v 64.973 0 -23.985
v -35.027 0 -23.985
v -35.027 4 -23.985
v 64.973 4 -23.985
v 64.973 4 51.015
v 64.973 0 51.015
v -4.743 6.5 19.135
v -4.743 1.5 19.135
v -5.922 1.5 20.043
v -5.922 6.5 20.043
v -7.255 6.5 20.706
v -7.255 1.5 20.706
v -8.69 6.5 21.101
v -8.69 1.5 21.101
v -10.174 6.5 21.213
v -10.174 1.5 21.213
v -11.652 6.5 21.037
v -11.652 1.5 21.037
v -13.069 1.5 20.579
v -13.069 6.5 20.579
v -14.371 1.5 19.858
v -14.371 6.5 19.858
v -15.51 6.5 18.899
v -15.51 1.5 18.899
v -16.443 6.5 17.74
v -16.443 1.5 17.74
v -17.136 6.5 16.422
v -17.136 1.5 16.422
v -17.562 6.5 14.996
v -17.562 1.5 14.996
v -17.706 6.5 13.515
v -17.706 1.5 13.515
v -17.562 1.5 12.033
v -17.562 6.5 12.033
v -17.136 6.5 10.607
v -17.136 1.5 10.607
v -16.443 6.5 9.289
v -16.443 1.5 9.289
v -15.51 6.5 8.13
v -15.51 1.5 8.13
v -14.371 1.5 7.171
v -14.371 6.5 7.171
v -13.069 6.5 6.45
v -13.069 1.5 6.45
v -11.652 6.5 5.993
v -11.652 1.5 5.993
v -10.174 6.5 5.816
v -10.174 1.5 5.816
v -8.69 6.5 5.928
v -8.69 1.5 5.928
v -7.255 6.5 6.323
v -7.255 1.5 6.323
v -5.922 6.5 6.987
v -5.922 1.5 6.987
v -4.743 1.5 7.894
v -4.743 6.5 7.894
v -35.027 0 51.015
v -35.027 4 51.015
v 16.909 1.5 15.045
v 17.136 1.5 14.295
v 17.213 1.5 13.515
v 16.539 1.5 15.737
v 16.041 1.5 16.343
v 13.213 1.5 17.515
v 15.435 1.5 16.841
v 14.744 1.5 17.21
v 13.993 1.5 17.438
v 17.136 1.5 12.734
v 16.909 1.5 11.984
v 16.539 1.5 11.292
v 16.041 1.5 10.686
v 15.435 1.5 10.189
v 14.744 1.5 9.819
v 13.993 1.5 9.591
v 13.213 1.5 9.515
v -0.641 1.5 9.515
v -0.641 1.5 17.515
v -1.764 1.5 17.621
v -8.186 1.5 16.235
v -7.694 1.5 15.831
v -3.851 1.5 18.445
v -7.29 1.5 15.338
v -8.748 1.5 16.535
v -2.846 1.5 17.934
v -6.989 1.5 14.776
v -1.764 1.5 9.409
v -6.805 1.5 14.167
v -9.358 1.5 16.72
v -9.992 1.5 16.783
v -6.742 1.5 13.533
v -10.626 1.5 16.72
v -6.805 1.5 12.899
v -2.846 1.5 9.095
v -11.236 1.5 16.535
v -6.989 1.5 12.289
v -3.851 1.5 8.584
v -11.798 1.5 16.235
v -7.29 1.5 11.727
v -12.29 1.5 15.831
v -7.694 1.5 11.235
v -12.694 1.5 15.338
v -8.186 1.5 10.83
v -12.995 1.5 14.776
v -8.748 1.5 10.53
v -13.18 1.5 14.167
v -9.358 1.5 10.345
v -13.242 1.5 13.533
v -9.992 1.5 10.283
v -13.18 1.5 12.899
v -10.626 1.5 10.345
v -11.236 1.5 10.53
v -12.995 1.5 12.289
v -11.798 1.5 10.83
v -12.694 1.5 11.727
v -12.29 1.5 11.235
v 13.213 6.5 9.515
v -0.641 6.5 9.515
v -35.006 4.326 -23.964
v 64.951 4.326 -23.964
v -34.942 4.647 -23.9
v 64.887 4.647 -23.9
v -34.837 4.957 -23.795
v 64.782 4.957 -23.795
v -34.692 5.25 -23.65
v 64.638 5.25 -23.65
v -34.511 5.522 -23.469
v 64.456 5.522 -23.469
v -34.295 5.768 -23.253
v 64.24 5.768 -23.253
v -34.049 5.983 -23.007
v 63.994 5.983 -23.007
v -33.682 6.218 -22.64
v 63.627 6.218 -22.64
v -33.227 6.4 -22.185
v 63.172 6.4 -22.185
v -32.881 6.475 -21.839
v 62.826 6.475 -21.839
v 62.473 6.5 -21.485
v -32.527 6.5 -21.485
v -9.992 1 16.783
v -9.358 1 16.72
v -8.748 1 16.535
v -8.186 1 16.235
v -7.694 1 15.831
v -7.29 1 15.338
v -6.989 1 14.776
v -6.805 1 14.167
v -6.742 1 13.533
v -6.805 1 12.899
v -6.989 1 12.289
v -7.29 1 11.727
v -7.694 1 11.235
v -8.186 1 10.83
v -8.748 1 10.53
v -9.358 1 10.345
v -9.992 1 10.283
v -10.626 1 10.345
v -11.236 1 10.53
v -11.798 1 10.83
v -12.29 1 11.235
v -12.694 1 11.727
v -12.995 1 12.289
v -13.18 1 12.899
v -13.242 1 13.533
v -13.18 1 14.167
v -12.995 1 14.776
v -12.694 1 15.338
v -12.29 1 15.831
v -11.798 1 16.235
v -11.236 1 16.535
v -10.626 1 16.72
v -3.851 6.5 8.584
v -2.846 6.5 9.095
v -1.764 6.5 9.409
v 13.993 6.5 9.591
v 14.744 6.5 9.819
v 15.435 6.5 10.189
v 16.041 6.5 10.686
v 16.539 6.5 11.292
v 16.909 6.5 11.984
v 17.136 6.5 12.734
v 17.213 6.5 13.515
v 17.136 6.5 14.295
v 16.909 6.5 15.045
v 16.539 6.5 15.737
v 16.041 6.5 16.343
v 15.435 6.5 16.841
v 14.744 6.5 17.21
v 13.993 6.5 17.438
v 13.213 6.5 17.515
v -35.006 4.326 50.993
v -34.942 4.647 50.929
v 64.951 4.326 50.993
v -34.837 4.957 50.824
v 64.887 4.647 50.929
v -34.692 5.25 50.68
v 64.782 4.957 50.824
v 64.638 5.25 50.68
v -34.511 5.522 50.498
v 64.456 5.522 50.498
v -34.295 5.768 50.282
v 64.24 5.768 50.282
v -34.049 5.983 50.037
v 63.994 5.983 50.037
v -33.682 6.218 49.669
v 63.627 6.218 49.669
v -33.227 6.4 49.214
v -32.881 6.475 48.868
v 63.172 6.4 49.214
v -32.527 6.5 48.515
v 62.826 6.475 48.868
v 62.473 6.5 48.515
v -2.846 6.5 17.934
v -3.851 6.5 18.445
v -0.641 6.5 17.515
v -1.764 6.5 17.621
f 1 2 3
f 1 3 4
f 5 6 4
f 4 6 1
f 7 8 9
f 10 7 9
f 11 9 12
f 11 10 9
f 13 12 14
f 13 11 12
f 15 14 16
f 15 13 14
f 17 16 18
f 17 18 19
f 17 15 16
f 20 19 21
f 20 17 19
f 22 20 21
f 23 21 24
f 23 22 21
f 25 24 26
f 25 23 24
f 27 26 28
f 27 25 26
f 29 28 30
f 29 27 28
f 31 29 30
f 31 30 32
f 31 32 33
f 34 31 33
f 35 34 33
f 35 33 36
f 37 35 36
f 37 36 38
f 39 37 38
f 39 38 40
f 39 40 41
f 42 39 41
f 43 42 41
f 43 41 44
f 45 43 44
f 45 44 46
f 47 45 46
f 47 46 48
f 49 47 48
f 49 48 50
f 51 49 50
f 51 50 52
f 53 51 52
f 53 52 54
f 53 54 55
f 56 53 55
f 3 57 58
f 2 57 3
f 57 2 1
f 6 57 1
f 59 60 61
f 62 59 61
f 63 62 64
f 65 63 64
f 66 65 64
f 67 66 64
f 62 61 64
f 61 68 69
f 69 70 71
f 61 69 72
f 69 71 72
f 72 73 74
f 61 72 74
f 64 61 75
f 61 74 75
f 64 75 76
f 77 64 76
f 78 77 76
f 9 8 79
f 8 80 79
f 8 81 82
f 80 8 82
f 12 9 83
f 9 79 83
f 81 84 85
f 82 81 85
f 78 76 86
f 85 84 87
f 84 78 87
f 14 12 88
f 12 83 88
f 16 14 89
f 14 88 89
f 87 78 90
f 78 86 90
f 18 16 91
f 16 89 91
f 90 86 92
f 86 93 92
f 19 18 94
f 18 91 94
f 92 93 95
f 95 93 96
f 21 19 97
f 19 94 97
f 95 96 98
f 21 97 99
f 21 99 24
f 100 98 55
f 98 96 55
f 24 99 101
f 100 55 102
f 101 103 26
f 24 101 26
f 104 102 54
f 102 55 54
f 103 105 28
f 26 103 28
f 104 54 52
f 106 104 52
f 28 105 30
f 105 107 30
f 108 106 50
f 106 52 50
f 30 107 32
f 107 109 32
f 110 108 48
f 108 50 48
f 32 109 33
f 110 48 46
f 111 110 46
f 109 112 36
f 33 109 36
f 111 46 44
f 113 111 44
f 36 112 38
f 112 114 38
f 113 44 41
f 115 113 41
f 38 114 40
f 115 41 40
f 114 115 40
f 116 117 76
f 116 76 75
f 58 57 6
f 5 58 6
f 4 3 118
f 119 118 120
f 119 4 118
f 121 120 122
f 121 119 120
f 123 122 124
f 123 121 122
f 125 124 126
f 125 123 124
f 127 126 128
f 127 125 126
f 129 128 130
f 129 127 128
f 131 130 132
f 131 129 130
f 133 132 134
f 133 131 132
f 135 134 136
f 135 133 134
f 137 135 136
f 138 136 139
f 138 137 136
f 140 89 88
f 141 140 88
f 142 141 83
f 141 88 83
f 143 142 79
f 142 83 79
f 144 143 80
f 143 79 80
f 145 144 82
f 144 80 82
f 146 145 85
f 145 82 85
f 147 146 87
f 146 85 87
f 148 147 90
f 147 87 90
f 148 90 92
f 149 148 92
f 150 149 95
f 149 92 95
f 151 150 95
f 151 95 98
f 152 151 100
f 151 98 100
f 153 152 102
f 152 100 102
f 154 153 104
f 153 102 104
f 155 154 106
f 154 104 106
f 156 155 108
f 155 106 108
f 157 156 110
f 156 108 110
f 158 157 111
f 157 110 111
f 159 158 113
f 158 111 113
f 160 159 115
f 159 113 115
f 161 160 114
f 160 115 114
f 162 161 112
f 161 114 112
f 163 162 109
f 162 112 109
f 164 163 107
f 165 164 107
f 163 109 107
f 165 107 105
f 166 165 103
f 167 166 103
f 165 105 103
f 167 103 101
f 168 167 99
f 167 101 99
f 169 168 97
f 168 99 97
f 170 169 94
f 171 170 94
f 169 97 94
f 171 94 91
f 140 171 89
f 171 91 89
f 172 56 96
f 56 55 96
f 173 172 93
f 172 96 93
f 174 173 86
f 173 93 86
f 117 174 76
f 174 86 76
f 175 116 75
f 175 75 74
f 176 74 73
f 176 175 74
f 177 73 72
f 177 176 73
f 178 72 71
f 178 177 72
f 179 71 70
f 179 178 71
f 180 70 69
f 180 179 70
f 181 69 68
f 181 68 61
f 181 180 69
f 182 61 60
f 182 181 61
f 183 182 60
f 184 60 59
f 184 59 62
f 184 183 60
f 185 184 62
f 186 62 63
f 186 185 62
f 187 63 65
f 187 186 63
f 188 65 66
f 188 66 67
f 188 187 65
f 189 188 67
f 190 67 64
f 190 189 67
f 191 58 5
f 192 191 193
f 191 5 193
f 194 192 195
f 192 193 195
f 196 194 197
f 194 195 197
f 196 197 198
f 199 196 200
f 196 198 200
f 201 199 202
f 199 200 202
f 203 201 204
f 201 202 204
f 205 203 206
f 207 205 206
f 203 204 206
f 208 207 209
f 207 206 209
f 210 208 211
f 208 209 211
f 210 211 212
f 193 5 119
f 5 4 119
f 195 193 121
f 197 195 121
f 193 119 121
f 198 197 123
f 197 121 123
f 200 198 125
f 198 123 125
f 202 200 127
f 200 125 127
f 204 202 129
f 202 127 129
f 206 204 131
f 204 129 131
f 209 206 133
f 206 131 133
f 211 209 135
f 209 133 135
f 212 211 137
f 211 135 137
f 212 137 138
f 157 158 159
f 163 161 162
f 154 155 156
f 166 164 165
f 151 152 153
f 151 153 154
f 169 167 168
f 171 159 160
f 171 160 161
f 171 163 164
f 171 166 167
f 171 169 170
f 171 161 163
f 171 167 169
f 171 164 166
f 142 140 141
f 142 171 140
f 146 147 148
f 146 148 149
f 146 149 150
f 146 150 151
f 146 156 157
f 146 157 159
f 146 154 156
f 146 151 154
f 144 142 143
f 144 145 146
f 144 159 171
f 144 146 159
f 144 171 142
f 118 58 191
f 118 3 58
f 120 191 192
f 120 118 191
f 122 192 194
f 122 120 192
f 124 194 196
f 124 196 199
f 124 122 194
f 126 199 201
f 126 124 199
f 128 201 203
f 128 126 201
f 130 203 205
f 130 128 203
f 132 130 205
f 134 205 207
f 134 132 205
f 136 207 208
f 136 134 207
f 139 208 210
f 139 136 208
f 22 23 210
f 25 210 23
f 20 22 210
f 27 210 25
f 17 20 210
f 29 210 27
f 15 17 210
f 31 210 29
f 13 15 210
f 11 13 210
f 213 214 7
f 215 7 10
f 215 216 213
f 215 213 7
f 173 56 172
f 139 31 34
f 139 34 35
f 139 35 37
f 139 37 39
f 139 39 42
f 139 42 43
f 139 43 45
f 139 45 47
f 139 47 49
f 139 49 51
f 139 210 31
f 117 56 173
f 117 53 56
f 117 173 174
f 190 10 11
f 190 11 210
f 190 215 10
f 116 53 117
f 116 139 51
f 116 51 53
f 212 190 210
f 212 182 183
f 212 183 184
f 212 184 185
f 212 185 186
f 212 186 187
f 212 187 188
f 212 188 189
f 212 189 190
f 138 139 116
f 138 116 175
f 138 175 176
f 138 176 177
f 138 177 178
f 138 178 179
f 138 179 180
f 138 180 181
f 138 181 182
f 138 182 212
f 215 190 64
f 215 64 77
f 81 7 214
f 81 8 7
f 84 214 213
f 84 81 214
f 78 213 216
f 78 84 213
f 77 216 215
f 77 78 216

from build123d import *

# Parameters (mm, degrees)
SKETCH2_W           = 100
SKETCH2_H           = 75
BOSS_EXTRUDE1_DEPTH = 6.5
FILLET1_R           = 2.5
CUT_EXTRUDE1_DEPTH  = 5
FILLET3_R           = 6
SKETCH4_R           = 3.25
CUT_EXTRUDE2_DEPTH  = 0.5


with BuildPart() as part:
    # Sketch2 → Boss-Extrude1 (new body)
    with BuildSketch(Plane(origin=(0, 0, 0), x_dir=(1, 0, 0), z_dir=(0, 1, 0))):
        with Locations((14.972577697, -13.514625229)):
            Rectangle(SKETCH2_W, SKETCH2_H)
    extrude(amount=BOSS_EXTRUDE1_DEPTH)

    # Fillet1
    fillet1_edges = [part.edges().sort_by_distance(p)[0] for p in [
        (64.972577697, 6.5, 13.514625229),
        (14.972577697, 6.5, -23.985374771),
        (-35.027422303, 6.5, 13.514625229),
        (14.972577697, 6.5, 51.014625229),
    ]]
    fillet(fillet1_edges, radius=FILLET1_R)

    # Sketch3 → Cut-Extrude1 (cut)
    with BuildSketch(Plane(origin=(0, 6.5, 0), x_dir=(1, 0, 0), z_dir=(0, 1, 0))):
        with BuildLine():
            Line((-3.42616702, -9.514625229), (13.213071542, -9.514625229))
            ThreePointArc((13.213071542, -9.514625229), (17.213071542, -13.514625229), (13.213071542, -17.514625229))
            Line((13.213071542, -17.514625229), (-3.42616702, -17.514625229))
            ThreePointArc((-3.42616702, -17.514625229), (-17.70568068, -13.514625229), (-3.42616702, -9.514625229))
        make_face()
    extrude(amount=-CUT_EXTRUDE1_DEPTH, mode=Mode.SUBTRACT)

    # Fillet3
    fillet3_edges = [part.edges().sort_by_distance(p)[0] for p in [
        (-3.42616702, 4, 17.514625229),
        (-3.42616702, 4, 9.514625229),
    ]]
    fillet(fillet3_edges, radius=FILLET3_R)

    # Sketch4 → Cut-Extrude2 (cut)
    with BuildSketch(Plane(origin=(0, 1.5, 0), x_dir=(1, 0, 0), z_dir=(0, 1, 0))):
        with Locations(Location((-9.992086902, -13.532706959, 0), (0, 0, 270))):
            Circle(SKETCH4_R)
    extrude(amount=-CUT_EXTRUDE2_DEPTH, mode=Mode.SUBTRACT)


solid = part.part
